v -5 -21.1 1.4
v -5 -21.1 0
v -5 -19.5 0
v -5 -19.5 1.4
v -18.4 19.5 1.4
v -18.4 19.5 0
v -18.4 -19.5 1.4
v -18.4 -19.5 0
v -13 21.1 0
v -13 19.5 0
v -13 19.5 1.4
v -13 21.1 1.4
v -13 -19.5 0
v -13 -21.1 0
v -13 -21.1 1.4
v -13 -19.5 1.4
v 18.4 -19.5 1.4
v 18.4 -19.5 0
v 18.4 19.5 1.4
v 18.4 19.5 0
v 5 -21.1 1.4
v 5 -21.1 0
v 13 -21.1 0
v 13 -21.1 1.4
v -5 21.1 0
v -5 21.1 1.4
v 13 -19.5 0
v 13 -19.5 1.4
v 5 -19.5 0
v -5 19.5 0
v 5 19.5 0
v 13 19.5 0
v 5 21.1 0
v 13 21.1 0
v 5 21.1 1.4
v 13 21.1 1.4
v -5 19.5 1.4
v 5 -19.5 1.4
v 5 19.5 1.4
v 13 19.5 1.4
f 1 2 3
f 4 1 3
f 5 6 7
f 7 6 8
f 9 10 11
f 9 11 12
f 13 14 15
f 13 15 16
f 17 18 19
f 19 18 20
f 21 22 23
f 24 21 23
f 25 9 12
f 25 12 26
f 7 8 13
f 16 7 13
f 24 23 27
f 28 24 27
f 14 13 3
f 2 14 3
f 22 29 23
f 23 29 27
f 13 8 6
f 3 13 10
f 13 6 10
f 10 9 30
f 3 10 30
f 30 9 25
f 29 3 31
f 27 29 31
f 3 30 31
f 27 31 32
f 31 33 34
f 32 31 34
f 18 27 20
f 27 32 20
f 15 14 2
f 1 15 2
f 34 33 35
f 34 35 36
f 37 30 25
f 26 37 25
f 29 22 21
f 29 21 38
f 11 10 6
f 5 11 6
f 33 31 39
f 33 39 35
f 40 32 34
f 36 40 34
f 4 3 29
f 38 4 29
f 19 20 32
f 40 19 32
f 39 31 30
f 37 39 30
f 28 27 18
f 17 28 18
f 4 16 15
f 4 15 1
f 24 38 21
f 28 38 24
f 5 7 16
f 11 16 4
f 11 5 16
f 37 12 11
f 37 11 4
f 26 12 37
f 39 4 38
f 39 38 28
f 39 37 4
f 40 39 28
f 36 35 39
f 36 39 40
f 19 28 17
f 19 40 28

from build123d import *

# Parameters (mm, degrees)
F0_W     = 8
F0_H     = 1.6
F2_DEPTH = 1.4


with BuildPart() as f2:
    # F0 (on Top) → F2 (new body)
    with BuildSketch(Plane.XY):
        with Locations((-9, -20.3)):
            Rectangle(F0_W, F0_H)
        with Locations((-9, 20.3)):
            Rectangle(F0_W, F0_H)
        Polygon((-13, 19.5), (-18.4, 19.5), (-18.4, -19.5), (-13, -19.5), (-5, -19.5), (5, -19.5), (13, -19.5), (18.4, -19.5), (18.4, 19.5), (13, 19.5), (5, 19.5), (-5, 19.5), align=None)
        with Locations((9, 20.3)):
            Rectangle(F0_W, F0_H)
        with Locations((9, -20.3)):
            Rectangle(F0_W, F0_H)
    extrude(amount=F2_DEPTH)


solid = f2.part
